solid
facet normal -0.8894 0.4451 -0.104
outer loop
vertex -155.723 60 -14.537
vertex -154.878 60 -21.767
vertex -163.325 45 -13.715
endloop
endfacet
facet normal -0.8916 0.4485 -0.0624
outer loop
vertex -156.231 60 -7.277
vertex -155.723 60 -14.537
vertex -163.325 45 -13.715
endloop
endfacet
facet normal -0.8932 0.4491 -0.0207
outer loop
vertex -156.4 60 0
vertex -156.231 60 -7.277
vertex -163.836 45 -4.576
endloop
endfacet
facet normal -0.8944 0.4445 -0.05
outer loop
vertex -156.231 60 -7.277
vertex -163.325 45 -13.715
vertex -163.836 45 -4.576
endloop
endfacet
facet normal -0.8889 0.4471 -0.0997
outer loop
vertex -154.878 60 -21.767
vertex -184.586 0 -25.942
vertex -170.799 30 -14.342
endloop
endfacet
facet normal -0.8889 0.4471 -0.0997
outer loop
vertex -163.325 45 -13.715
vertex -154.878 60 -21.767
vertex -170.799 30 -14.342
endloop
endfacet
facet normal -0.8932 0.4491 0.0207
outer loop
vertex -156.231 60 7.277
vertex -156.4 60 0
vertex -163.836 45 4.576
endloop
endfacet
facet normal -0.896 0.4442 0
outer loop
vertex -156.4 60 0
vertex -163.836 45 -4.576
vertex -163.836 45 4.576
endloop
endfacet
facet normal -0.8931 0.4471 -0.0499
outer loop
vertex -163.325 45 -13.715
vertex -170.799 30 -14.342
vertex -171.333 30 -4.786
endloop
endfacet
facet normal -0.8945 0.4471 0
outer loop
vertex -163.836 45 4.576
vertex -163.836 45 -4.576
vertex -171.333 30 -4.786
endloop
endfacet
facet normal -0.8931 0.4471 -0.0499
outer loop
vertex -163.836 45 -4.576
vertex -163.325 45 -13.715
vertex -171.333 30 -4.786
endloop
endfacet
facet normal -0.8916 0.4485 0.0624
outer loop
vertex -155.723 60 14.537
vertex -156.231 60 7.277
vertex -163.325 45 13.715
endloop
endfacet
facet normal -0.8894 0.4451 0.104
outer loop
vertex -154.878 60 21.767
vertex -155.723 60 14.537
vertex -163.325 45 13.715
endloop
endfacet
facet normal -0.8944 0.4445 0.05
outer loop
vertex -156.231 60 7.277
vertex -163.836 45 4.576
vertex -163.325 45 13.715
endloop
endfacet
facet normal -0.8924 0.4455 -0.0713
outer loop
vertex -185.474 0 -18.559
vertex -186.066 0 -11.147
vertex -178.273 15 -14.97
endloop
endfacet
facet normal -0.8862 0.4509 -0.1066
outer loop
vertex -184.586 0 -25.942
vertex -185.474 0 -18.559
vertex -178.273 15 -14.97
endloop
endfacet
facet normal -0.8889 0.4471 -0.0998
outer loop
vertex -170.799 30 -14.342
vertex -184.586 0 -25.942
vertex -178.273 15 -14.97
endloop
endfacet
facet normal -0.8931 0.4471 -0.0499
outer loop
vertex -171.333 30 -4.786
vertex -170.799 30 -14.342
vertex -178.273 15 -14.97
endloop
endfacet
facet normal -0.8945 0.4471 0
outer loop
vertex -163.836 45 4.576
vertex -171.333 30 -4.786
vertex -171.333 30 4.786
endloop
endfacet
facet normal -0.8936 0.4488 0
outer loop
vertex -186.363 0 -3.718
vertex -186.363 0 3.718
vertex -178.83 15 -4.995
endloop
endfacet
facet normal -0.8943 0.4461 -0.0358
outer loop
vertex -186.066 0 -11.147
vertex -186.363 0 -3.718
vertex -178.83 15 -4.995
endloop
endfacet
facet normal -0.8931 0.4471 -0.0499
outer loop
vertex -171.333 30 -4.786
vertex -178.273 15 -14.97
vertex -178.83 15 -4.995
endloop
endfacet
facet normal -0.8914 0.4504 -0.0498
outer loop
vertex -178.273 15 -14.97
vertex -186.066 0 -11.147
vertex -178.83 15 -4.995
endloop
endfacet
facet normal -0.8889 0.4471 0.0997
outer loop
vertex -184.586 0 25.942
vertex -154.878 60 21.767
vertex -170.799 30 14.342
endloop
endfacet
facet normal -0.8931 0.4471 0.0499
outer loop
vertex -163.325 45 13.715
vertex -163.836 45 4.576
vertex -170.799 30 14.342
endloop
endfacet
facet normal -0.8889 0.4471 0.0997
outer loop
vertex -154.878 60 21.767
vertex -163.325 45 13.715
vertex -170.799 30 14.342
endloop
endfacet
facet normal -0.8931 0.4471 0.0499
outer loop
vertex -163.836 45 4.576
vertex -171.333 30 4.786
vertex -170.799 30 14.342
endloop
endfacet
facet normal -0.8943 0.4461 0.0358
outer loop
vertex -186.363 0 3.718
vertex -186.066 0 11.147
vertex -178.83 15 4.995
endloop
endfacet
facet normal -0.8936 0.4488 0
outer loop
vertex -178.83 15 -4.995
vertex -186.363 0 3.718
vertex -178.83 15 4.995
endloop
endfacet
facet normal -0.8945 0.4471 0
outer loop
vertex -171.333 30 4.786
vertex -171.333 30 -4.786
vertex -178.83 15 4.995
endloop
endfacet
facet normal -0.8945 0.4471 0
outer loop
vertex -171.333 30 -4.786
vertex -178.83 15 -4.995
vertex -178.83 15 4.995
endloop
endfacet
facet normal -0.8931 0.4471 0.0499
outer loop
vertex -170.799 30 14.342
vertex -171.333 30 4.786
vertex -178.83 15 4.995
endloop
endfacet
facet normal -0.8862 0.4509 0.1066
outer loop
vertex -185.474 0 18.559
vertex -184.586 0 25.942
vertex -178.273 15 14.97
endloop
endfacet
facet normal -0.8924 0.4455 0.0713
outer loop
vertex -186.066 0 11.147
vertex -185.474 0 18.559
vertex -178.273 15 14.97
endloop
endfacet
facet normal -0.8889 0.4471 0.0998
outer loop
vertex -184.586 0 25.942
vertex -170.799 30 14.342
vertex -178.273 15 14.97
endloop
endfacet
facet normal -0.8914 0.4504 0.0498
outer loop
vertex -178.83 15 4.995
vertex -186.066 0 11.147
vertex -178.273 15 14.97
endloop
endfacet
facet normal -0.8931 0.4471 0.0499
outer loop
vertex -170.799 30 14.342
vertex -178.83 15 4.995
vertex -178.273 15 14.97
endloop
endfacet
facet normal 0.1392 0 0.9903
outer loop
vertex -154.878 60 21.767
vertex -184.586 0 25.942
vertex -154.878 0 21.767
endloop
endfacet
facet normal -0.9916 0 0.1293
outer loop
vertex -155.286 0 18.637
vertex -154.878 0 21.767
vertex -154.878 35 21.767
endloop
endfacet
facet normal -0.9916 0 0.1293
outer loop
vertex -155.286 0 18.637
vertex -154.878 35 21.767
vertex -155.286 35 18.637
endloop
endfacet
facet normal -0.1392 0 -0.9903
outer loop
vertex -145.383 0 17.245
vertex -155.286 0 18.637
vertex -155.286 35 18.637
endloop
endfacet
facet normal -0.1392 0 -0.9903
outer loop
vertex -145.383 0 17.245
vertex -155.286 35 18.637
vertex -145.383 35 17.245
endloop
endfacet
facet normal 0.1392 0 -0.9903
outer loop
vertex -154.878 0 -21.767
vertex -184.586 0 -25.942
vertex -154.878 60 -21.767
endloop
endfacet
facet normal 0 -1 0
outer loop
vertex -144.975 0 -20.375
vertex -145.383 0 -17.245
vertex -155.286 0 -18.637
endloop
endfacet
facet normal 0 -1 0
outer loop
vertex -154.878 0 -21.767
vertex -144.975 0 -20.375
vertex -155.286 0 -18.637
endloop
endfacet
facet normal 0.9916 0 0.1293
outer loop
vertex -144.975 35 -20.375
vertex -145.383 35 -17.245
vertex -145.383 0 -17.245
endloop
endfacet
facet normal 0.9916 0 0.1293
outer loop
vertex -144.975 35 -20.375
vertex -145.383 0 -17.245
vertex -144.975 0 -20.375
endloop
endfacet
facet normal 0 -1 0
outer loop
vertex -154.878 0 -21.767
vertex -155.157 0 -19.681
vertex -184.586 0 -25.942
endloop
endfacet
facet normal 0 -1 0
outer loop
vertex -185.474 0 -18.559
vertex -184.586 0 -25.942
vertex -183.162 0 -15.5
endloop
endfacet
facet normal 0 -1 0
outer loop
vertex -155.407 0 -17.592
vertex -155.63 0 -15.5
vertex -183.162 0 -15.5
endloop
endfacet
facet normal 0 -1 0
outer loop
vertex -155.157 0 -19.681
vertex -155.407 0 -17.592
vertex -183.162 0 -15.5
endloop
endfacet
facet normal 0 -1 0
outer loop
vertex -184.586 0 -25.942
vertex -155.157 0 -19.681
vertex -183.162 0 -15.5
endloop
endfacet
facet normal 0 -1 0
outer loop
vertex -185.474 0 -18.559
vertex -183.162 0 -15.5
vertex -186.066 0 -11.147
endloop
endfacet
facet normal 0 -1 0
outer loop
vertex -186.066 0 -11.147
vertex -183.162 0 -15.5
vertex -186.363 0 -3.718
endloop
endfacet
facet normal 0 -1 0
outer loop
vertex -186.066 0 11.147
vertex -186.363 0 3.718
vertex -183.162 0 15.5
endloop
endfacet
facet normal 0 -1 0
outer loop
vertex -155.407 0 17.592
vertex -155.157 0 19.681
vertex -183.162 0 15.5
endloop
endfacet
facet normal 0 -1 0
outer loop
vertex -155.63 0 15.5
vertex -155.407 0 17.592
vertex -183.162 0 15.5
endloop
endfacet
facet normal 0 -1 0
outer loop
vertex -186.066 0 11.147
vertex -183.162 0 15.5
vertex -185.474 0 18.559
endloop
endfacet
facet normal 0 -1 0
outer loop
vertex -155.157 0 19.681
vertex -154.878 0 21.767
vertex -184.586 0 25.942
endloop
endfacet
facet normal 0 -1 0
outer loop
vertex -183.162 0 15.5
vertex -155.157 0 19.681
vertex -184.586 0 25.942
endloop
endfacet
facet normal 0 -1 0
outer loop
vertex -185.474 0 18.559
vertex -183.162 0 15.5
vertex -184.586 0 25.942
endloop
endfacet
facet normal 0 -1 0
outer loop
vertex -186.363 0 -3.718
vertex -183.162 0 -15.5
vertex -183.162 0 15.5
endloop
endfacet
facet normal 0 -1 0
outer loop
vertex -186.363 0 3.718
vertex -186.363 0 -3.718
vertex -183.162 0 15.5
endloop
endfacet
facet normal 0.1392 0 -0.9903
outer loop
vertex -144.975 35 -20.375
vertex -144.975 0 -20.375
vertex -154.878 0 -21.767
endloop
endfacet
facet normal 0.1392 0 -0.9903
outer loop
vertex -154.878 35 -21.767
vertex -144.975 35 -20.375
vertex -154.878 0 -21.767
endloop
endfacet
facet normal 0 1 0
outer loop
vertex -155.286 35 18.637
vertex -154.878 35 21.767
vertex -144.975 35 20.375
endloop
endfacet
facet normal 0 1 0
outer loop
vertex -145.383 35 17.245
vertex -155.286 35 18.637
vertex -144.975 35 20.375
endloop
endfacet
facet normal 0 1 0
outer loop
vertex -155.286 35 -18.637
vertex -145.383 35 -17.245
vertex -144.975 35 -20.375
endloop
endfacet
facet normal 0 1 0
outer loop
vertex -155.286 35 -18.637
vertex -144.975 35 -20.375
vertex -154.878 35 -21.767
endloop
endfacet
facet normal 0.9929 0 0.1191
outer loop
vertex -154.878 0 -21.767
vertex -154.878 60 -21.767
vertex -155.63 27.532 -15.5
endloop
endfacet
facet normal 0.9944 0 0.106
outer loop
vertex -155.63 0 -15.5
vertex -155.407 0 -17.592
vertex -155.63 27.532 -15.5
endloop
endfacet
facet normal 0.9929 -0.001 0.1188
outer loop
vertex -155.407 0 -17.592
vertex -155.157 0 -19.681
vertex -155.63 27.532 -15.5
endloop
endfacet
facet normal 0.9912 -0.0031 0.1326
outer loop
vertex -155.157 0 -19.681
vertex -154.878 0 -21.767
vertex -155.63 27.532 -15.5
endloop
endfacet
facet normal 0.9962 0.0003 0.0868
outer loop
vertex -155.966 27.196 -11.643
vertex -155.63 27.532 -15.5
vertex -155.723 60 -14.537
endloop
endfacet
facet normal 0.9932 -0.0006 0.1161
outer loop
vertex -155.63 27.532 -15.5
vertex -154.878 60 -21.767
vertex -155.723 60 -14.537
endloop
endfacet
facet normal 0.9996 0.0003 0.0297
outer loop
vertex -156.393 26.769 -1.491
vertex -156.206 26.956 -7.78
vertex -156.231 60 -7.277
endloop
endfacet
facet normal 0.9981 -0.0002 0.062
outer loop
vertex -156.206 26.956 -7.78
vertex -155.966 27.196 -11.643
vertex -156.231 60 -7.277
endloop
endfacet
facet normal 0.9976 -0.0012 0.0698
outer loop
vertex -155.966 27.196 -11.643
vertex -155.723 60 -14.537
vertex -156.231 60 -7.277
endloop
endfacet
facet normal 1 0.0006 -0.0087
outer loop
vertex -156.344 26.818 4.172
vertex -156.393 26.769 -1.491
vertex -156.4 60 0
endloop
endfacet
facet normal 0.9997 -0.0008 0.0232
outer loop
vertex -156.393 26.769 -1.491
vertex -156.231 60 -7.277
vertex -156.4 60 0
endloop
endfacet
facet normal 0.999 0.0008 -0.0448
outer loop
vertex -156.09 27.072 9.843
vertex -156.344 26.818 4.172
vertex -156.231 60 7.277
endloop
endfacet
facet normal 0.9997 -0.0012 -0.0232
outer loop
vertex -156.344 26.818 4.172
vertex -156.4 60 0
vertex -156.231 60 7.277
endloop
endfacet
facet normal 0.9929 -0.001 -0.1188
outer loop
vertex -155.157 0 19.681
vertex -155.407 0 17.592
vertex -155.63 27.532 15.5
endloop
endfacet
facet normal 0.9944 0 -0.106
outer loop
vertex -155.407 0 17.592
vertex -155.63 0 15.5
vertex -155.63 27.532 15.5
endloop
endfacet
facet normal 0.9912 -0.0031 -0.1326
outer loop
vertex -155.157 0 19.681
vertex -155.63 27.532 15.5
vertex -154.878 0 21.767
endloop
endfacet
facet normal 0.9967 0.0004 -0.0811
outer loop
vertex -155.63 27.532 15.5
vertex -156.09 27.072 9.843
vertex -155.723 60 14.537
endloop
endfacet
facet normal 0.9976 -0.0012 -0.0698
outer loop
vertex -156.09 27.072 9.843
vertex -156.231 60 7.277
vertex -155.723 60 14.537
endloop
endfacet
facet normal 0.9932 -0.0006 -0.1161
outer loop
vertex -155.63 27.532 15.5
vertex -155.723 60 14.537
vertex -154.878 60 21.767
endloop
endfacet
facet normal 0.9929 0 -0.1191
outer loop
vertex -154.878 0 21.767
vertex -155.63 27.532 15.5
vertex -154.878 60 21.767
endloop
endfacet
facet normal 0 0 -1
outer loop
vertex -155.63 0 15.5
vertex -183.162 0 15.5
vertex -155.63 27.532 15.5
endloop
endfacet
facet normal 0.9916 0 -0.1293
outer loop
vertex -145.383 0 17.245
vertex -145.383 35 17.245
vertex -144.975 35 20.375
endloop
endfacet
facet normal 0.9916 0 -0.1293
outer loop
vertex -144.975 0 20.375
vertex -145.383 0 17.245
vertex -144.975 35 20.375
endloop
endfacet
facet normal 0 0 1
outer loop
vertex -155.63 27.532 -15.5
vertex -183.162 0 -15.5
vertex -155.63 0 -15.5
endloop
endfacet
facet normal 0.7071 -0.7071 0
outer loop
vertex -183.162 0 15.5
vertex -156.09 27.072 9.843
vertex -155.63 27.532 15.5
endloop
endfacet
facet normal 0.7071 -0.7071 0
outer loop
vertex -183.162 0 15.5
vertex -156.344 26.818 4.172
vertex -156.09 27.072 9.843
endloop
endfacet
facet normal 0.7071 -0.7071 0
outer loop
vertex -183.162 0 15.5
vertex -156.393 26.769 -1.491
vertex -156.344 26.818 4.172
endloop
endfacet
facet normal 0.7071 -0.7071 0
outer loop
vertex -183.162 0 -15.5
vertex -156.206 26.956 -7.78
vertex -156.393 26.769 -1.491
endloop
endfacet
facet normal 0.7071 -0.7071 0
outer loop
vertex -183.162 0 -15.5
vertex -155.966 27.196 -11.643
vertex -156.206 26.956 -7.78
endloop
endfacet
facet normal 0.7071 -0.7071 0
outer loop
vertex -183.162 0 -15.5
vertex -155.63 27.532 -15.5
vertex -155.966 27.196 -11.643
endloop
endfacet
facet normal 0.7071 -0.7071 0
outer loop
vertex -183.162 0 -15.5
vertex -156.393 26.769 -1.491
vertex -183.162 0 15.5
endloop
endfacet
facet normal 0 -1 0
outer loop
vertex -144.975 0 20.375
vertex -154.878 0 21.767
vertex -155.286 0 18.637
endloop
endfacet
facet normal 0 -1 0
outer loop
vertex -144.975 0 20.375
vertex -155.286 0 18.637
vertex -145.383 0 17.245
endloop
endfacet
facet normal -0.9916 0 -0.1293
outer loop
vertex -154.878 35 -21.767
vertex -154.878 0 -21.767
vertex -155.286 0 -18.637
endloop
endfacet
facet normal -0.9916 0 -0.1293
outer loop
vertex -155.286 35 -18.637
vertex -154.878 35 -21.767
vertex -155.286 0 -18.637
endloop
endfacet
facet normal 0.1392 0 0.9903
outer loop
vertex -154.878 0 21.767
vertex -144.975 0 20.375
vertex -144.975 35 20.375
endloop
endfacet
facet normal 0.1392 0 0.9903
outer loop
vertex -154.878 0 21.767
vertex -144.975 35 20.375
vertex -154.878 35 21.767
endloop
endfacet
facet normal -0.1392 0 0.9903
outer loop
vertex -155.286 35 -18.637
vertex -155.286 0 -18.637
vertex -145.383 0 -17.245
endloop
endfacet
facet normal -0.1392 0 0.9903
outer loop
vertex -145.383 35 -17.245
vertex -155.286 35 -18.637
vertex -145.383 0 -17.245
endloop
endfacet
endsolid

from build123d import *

# Parameters (mm, degrees)
REVOLVE1_ANGLE           = 8
REVOLVE1_OTHER_WAY_ANGLE = 8
CUT_EXTRUDE1_DEPTH       = 15.5
CUT_EXTRUDE1_DEPTH_BACK  = 15.5
BOSS_EXTRUDE1_DEPTH      = 35
BOSS_EXTRUDE1_2_DEPTH    = 35


with BuildPart() as part:
    # Sketch4 → Revolve1 (revolve)
    with BuildSketch(Plane.XY):
        Polygon((-156.4, 0), (-156.4, 60), (-186.4, 0), align=None)
    revolve(axis=Axis((0, 70, 0), (0, -1, 0)), revolution_arc=REVOLVE1_ANGLE)

    # Sketch4 → Revolve1 other way (revolve)
    with BuildSketch(Plane.XY):
        Polygon((-156.4, 0), (-156.4, 60), (-186.4, 0), align=None)
    revolve(axis=Axis((0, 70, 0), (0, 1, 0)), revolution_arc=REVOLVE1_OTHER_WAY_ANGLE)

    # Sketch6 → Cut-Extrude1 (cut, two sides: drawn at the far end of the back side and taken through both)
    with BuildSketch(Plane.XY.offset(-CUT_EXTRUDE1_DEPTH_BACK)):
        Polygon((-154.877925951, 28.284271247), (-183.162197199, 0), (-154.877925951, 0), align=None)
    extrude(amount=CUT_EXTRUDE1_DEPTH + CUT_EXTRUDE1_DEPTH_BACK, mode=Mode.SUBTRACT)


with BuildPart() as body_2:
    # Sketch7 → Boss-Extrude1 (new body)
    with BuildSketch(Plane.XZ):
        Polygon((-154.877925951, 21.76667299), (-155.285599305, 18.637130911), (-145.382918617, 17.245399902), (-144.975245264, 20.374941981), align=None)
    extrude(amount=-BOSS_EXTRUDE1_DEPTH)


with BuildPart() as body_3:
    # Sketch7 → Boss-Extrude1 2 (new body)
    with BuildSketch(Plane.XZ):
        Polygon((-154.877925951, -21.76667299), (-155.285599305, -18.637130911), (-145.382918617, -17.245399902), (-144.975245264, -20.374941981), align=None)
    extrude(amount=-BOSS_EXTRUDE1_2_DEPTH)


solid = Compound([part.part, body_2.part, body_3.part])
